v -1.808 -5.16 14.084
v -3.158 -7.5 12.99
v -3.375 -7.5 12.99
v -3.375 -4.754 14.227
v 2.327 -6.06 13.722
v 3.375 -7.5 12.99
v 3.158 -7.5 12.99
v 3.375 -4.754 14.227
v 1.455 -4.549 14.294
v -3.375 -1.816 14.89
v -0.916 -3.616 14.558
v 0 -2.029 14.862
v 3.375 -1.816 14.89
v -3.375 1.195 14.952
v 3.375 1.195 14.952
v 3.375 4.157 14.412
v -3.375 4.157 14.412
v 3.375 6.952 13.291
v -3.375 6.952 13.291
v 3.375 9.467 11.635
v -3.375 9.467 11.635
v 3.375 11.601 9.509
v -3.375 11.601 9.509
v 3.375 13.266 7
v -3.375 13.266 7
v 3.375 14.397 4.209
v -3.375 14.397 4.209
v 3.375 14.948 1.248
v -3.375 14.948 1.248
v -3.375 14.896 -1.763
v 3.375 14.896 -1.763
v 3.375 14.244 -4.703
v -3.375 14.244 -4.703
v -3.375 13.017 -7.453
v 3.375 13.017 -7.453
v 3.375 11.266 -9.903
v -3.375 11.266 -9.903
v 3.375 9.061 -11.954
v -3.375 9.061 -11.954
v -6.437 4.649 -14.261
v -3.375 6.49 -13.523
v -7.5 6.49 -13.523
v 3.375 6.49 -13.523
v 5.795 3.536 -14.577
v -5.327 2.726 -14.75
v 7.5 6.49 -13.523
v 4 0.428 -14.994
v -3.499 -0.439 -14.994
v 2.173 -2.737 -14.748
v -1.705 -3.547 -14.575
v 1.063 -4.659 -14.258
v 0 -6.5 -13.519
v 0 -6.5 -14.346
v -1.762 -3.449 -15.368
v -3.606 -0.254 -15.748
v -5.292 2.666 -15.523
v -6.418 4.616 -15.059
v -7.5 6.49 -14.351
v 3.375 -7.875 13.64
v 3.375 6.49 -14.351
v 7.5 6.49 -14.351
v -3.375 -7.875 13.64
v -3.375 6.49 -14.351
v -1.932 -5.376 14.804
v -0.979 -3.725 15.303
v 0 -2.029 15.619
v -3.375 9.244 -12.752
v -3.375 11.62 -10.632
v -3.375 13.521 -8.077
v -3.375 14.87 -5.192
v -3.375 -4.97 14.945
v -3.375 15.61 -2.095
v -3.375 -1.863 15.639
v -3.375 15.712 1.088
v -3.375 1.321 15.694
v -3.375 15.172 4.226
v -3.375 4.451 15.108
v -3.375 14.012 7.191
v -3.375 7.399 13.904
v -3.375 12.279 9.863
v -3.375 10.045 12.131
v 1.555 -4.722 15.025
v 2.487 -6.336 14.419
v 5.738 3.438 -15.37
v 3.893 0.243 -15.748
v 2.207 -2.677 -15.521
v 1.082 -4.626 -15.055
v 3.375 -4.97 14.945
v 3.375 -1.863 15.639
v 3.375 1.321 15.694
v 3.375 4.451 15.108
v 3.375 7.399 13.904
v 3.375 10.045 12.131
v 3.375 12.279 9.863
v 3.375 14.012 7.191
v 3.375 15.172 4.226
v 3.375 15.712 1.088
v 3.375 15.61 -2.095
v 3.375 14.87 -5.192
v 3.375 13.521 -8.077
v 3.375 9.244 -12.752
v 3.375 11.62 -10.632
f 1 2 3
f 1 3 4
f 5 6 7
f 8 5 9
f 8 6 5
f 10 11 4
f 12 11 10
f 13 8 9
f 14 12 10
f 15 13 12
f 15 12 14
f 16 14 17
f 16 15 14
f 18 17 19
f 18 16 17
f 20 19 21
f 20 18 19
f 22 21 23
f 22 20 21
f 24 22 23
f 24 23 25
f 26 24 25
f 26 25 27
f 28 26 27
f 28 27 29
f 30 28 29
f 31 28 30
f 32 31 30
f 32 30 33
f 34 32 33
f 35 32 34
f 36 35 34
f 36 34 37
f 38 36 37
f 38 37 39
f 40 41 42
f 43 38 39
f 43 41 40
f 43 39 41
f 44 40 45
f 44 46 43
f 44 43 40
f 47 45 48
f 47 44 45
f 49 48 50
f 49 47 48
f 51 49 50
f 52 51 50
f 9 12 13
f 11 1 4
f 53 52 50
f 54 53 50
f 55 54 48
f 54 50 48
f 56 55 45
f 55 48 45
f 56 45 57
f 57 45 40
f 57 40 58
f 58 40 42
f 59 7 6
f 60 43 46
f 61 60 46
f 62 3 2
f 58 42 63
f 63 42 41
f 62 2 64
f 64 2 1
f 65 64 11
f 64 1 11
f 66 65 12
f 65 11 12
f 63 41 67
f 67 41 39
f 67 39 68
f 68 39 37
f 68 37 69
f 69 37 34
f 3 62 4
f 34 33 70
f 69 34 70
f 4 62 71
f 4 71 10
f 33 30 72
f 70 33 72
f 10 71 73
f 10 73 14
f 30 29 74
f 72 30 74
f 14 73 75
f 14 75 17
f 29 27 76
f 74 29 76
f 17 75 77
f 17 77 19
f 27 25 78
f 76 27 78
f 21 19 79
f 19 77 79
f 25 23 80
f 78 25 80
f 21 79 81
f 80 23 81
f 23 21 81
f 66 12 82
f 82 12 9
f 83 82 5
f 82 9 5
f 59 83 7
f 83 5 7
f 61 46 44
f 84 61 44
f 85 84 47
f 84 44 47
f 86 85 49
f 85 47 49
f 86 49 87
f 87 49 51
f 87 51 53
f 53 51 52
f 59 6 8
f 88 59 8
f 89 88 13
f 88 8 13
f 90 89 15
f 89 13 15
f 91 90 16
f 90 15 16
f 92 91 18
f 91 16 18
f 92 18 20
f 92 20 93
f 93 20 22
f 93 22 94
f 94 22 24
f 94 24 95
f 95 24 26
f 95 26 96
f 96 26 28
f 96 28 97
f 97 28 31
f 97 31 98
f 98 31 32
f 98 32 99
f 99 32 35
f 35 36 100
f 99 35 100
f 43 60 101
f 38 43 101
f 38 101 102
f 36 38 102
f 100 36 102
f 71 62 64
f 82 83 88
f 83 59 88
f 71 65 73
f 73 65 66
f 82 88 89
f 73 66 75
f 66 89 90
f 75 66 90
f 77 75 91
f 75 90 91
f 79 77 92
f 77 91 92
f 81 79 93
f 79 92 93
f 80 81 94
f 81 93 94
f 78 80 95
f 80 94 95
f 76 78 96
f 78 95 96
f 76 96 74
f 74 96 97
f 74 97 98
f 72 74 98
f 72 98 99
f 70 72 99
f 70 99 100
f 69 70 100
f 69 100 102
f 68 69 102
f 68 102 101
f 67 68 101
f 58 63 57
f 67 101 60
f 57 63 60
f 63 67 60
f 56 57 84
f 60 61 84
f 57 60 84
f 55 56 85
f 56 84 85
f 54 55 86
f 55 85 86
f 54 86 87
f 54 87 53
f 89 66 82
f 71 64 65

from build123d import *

# Parameters (mm, degrees)
CIRCULARBAND_W               = 15
CIRCULARBAND_H               = 0.75
BASE_REVOLVE_ANGLE           = 120
BASE_REVOLVE_OTHER_WAY_ANGLE = 120
SKETCH9_OUTSIDE_W            = 25.428
SKETCH9_OUTSIDE_H            = 34.053
HEAD1_DEPTH                  = 16.75
SKETCH10_OUTSIDE_W           = 25.428
SKETCH10_OUTSIDE_H           = 34.053
TAIL1_DEPTH                  = 16.75


with BuildPart() as part:
    # circularband → Base-Revolve (revolve)
    with BuildSketch(Plane.XY):
        with Locations((0, 15.375)):
            Rectangle(CIRCULARBAND_W, CIRCULARBAND_H)
    revolve(axis=Axis((0, 0, 0), (1, 0, 0)), revolution_arc=BASE_REVOLVE_ANGLE)

    # circularband → Base-Revolve other way (revolve)
    with BuildSketch(Plane.XY):
        with Locations((0, 15.375)):
            Rectangle(CIRCULARBAND_W, CIRCULARBAND_H)
    revolve(axis=Axis((0, 0, 0), (-1, 0, 0)), revolution_arc=BASE_REVOLVE_OTHER_WAY_ANGLE)

    # Sketch9 outside → head1 (cut, through all)
    with BuildSketch(Plane.XY):
        with Locations((0, 3.9375)):
            Rectangle(SKETCH9_OUTSIDE_W, SKETCH9_OUTSIDE_H)
        Polygon((-3.375, 15.75), (3.375, 15.75), (3.375, 6.490381057), (7.5, 6.490381057), (0, -6.5), (-7.5, 6.490381057), (-3.375, 6.490381057), align=None, mode=Mode.SUBTRACT)
    extrude(amount=-HEAD1_DEPTH, mode=Mode.SUBTRACT)

    # Sketch10 outside → tail1 (cut, through all)
    with BuildSketch(Plane.XY):
        with Locations((0, 3.9375)):
            Rectangle(SKETCH10_OUTSIDE_W, SKETCH10_OUTSIDE_H)
        Polygon((0, -2.029328524), (3.375, -7.875), (3.375, 15.75), (-3.375, 15.75), (-3.375, -7.875), align=None, mode=Mode.SUBTRACT)
    extrude(amount=TAIL1_DEPTH, mode=Mode.SUBTRACT)


solid = part.part
